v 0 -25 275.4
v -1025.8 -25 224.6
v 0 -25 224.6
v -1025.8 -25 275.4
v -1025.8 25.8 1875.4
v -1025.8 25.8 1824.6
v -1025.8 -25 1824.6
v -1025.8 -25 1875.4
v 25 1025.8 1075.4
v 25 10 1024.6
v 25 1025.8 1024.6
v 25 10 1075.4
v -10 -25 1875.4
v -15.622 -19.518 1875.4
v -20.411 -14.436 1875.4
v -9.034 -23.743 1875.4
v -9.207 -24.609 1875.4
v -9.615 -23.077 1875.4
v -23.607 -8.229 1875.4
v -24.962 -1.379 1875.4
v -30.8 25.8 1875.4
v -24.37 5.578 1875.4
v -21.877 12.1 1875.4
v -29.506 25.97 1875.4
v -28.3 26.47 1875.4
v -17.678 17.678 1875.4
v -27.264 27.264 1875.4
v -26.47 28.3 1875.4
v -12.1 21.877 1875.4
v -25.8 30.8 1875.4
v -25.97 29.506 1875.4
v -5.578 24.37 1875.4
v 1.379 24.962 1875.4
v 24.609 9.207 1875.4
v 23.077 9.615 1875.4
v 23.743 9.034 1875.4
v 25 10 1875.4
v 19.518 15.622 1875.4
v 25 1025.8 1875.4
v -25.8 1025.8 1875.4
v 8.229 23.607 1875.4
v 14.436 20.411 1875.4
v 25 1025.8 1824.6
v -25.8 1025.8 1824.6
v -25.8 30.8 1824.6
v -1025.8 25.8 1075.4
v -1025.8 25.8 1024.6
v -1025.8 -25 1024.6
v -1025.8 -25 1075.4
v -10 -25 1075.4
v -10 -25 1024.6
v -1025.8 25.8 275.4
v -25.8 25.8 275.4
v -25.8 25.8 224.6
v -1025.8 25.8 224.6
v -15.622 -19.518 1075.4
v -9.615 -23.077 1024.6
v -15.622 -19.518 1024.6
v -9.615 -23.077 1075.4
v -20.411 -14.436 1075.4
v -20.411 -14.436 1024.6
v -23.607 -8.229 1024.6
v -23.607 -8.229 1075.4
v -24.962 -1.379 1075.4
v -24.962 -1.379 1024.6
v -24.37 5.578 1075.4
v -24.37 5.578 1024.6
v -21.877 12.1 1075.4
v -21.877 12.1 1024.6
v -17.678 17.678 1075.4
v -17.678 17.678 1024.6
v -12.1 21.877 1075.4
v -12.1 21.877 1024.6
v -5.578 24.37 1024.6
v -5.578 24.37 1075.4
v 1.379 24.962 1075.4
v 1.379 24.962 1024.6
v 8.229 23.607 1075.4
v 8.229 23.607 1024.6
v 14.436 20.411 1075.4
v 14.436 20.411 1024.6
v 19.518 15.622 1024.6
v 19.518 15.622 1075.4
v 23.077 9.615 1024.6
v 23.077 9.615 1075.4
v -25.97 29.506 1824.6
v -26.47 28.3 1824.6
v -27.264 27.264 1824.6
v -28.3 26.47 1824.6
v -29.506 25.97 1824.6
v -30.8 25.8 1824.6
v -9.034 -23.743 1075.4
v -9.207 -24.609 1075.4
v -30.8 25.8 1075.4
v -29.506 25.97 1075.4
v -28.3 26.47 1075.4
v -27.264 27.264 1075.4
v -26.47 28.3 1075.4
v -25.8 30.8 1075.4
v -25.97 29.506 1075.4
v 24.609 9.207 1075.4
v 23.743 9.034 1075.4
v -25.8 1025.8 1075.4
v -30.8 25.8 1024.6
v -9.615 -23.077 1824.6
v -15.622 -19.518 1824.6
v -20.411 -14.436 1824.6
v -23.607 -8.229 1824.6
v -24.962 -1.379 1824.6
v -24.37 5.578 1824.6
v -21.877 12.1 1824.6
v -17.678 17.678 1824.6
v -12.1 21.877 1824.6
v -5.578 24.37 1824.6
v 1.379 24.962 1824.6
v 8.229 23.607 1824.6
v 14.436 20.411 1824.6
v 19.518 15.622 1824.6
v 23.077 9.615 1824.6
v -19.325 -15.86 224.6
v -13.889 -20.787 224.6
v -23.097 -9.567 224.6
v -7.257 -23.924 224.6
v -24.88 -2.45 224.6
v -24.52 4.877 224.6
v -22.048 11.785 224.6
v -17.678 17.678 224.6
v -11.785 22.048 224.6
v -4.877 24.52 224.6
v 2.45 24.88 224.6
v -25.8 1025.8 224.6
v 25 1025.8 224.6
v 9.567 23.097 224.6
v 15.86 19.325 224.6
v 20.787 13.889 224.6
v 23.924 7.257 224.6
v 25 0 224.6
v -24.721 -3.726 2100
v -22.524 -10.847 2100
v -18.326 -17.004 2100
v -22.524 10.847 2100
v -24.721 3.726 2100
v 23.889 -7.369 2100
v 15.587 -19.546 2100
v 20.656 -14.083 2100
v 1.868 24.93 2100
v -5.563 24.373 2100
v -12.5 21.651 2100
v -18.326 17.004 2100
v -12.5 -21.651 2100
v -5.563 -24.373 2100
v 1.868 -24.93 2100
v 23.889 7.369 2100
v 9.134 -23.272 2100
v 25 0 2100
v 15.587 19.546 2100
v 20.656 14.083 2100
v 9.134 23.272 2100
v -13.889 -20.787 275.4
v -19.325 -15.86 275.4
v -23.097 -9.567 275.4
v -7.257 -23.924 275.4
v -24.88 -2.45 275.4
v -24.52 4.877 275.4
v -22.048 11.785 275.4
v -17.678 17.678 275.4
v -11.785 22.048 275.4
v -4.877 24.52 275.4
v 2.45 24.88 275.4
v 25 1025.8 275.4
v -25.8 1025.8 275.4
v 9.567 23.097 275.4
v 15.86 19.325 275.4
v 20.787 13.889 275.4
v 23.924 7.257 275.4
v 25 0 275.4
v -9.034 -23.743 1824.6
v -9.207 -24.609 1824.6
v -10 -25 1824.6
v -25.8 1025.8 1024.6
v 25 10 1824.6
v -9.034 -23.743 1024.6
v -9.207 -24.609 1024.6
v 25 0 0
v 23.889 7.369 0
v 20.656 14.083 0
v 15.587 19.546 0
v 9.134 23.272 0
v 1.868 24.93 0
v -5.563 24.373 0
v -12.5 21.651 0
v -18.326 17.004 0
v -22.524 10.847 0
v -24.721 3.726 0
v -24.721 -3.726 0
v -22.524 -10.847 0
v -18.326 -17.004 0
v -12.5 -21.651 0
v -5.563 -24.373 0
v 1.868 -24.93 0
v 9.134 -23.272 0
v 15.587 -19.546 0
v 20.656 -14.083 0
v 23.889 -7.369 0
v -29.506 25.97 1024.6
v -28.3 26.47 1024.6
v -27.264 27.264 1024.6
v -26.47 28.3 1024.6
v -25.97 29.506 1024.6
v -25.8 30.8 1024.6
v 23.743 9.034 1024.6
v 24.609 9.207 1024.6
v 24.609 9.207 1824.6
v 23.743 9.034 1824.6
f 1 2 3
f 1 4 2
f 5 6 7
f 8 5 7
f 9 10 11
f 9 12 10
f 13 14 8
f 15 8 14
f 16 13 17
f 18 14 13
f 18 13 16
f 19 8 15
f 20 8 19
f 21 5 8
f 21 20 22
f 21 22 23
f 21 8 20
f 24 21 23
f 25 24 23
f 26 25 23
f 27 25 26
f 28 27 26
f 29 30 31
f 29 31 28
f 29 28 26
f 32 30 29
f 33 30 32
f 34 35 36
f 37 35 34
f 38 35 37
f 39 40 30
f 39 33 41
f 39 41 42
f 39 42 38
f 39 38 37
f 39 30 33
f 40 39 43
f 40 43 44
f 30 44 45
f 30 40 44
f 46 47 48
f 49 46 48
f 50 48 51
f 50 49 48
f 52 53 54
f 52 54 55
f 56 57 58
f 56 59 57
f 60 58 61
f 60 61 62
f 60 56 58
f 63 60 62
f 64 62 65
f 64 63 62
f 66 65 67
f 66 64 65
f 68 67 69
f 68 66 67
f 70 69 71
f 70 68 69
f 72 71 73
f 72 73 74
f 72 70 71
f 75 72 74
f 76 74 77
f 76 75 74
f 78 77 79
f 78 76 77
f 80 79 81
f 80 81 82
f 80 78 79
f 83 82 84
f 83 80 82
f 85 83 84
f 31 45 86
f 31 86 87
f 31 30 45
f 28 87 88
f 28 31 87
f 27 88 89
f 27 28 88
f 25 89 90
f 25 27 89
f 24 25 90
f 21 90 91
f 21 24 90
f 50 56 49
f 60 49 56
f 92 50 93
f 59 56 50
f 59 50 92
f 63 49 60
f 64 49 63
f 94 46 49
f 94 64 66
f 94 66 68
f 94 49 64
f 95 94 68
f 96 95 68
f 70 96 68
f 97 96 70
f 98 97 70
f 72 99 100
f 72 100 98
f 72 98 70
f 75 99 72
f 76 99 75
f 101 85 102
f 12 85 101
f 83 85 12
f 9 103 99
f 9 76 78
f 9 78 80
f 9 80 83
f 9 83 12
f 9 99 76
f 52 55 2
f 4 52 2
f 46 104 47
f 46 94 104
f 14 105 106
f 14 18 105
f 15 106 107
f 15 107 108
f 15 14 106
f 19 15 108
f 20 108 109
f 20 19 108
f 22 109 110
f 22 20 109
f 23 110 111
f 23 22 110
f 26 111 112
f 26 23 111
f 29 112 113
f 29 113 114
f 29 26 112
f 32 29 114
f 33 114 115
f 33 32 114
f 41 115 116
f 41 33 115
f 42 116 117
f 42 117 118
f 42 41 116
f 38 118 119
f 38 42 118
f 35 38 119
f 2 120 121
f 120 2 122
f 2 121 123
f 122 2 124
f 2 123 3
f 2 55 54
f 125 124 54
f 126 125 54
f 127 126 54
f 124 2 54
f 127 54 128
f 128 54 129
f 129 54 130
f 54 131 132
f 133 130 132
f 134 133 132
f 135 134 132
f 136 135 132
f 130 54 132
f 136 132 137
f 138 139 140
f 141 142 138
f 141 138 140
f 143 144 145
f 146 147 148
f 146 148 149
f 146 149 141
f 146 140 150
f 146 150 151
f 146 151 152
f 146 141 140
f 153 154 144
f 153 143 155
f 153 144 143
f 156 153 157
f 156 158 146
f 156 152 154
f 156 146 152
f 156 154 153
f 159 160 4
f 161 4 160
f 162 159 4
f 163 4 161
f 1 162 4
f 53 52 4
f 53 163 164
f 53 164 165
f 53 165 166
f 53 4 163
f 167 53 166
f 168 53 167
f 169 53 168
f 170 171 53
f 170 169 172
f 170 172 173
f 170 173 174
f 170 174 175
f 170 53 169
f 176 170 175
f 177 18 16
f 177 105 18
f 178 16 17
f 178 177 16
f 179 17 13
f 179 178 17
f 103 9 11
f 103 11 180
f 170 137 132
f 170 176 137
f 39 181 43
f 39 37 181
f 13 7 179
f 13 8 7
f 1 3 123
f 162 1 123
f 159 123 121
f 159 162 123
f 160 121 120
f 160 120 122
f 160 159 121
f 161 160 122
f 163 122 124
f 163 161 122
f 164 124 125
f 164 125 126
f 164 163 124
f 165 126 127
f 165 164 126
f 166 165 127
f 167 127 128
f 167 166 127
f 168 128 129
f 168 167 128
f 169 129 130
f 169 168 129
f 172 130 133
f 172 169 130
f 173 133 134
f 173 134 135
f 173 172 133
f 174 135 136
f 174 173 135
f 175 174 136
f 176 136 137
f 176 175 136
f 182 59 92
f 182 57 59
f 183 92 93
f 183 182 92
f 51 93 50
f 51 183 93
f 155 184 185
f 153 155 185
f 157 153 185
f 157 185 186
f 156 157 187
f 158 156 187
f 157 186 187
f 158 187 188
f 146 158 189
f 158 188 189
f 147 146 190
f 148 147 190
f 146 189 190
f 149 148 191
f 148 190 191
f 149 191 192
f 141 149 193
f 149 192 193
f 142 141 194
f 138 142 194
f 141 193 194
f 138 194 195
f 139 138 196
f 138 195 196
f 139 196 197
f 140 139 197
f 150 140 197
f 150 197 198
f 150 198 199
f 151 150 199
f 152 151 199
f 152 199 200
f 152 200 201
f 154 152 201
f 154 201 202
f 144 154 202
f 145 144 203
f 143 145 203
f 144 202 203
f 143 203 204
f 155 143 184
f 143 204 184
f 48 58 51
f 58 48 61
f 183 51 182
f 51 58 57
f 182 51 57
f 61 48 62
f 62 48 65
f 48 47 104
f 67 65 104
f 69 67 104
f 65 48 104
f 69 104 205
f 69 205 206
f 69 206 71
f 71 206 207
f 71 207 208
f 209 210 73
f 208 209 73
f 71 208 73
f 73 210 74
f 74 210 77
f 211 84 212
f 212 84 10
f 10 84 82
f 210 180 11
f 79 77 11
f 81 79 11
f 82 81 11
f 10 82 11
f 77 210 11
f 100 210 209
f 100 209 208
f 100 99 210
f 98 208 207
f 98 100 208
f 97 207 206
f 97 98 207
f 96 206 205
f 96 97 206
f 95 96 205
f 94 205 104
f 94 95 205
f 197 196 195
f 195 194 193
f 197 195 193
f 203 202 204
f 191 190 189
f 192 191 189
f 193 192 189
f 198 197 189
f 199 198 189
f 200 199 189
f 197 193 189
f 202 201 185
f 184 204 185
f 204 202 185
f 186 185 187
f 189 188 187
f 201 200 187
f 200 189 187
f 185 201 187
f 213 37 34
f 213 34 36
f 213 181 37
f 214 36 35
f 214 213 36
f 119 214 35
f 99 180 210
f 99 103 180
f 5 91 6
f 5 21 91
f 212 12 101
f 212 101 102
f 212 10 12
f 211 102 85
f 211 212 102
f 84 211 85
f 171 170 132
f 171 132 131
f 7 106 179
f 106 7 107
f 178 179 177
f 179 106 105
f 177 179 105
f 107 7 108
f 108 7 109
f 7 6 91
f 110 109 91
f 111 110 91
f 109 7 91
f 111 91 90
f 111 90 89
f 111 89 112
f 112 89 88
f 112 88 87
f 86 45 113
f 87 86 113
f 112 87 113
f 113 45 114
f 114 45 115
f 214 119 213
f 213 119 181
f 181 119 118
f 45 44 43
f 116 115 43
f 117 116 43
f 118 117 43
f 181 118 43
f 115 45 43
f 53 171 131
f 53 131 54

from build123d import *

# Parameters (mm, degrees)
SKETCH_1_R             = 25
EXTRUDE_1_DEPTH        = 2100
EXTRUDE_2_DEPTH        = 25.4
FILLET_8_R             = 1
FILLET_9_R             = 5
PATTERN_LINEAR_4_COUNT = 3
PATTERN_LINEAR_4_PITCH = 800
FILLET_10_R            = 1
FILLET_11_R            = 5


with BuildPart() as part:
    # 草图1 → 凸台-拉伸1 (new body)
    with BuildSketch(Plane.XY):
        Circle(SKETCH_1_R)
    extrude(amount=EXTRUDE_1_DEPTH)


with BuildPart() as body_2:
    # 草图2 → 凸台-拉伸2 (new, symmetric)
    with BuildSketch(Plane.XY.offset(1850)):
        with BuildLine():
            Line((24.999999999999982, 1.73e-15), (24.999999999999982, 1025.8))
            Line((24.999999999999982, 1025.8), (-25.80000000000002, 1025.8))
            Line((-25.80000000000002, 1025.8), (-25.799999999999898, 25.800000000000157))
            Line((-25.799999999999898, 25.800000000000157), (-1025.8, 25.79999999999627))
            Line((-1025.8, 25.79999999999627), (-1025.7999999999997, -25.000000000003688))
            Line((-1025.7999999999997, -25.000000000003688), (9.021e-14, -24.999999999999982))
            ThreePointArc((9.021e-14, -24.999999999999982), (-17.67766952966371, 17.67766952966364), (24.999999999999982, 1.73e-15))
        make_face()
    extrude_2 = extrude(amount=EXTRUDE_2_DEPTH, both=True)

    # 圆角8
    fillet_8_edges = [body_2.edges().sort_by_distance(p)[0] for p in [
        (9.021e-14, -24.999999999999982, 1850),
        (24.999999999999986, 2.86e-15, 1850),
    ]]
    fillet(fillet_8_edges, radius=FILLET_8_R)

    # 圆角9
    fillet_9_edges = [body_2.edges().sort_by_distance(p)[0] for p in [
        (-25.799999999999898, 25.800000000000157, 1850),
    ]]
    fillet(fillet_9_edges, radius=FILLET_9_R)


with BuildPart() as pattern_linear_4_1:
    # 阵列(线性)4: 凸台-拉伸2 ×3
    with Locations(*[(0, 0, -i * PATTERN_LINEAR_4_PITCH) for i in range(1, PATTERN_LINEAR_4_COUNT)]):
        add(extrude_2)

    # 圆角10
    fillet_10_edges = [pattern_linear_4_1.edges().sort_by_distance(p)[0] for p in [
        (9.021e-14, -24.999999999999982, 1050),
        (24.999999999999986, 2.86e-15, 1050),
    ]]
    fillet(fillet_10_edges, radius=FILLET_10_R)

    # 圆角11
    fillet_11_edges = [pattern_linear_4_1.edges().sort_by_distance(p)[0] for p in [
        (-25.799999999999898, 25.800000000000157, 1050),
    ]]
    fillet(fillet_11_edges, radius=FILLET_11_R)


solid = Compound([part.part, body_2.part, pattern_linear_4_1.part])
